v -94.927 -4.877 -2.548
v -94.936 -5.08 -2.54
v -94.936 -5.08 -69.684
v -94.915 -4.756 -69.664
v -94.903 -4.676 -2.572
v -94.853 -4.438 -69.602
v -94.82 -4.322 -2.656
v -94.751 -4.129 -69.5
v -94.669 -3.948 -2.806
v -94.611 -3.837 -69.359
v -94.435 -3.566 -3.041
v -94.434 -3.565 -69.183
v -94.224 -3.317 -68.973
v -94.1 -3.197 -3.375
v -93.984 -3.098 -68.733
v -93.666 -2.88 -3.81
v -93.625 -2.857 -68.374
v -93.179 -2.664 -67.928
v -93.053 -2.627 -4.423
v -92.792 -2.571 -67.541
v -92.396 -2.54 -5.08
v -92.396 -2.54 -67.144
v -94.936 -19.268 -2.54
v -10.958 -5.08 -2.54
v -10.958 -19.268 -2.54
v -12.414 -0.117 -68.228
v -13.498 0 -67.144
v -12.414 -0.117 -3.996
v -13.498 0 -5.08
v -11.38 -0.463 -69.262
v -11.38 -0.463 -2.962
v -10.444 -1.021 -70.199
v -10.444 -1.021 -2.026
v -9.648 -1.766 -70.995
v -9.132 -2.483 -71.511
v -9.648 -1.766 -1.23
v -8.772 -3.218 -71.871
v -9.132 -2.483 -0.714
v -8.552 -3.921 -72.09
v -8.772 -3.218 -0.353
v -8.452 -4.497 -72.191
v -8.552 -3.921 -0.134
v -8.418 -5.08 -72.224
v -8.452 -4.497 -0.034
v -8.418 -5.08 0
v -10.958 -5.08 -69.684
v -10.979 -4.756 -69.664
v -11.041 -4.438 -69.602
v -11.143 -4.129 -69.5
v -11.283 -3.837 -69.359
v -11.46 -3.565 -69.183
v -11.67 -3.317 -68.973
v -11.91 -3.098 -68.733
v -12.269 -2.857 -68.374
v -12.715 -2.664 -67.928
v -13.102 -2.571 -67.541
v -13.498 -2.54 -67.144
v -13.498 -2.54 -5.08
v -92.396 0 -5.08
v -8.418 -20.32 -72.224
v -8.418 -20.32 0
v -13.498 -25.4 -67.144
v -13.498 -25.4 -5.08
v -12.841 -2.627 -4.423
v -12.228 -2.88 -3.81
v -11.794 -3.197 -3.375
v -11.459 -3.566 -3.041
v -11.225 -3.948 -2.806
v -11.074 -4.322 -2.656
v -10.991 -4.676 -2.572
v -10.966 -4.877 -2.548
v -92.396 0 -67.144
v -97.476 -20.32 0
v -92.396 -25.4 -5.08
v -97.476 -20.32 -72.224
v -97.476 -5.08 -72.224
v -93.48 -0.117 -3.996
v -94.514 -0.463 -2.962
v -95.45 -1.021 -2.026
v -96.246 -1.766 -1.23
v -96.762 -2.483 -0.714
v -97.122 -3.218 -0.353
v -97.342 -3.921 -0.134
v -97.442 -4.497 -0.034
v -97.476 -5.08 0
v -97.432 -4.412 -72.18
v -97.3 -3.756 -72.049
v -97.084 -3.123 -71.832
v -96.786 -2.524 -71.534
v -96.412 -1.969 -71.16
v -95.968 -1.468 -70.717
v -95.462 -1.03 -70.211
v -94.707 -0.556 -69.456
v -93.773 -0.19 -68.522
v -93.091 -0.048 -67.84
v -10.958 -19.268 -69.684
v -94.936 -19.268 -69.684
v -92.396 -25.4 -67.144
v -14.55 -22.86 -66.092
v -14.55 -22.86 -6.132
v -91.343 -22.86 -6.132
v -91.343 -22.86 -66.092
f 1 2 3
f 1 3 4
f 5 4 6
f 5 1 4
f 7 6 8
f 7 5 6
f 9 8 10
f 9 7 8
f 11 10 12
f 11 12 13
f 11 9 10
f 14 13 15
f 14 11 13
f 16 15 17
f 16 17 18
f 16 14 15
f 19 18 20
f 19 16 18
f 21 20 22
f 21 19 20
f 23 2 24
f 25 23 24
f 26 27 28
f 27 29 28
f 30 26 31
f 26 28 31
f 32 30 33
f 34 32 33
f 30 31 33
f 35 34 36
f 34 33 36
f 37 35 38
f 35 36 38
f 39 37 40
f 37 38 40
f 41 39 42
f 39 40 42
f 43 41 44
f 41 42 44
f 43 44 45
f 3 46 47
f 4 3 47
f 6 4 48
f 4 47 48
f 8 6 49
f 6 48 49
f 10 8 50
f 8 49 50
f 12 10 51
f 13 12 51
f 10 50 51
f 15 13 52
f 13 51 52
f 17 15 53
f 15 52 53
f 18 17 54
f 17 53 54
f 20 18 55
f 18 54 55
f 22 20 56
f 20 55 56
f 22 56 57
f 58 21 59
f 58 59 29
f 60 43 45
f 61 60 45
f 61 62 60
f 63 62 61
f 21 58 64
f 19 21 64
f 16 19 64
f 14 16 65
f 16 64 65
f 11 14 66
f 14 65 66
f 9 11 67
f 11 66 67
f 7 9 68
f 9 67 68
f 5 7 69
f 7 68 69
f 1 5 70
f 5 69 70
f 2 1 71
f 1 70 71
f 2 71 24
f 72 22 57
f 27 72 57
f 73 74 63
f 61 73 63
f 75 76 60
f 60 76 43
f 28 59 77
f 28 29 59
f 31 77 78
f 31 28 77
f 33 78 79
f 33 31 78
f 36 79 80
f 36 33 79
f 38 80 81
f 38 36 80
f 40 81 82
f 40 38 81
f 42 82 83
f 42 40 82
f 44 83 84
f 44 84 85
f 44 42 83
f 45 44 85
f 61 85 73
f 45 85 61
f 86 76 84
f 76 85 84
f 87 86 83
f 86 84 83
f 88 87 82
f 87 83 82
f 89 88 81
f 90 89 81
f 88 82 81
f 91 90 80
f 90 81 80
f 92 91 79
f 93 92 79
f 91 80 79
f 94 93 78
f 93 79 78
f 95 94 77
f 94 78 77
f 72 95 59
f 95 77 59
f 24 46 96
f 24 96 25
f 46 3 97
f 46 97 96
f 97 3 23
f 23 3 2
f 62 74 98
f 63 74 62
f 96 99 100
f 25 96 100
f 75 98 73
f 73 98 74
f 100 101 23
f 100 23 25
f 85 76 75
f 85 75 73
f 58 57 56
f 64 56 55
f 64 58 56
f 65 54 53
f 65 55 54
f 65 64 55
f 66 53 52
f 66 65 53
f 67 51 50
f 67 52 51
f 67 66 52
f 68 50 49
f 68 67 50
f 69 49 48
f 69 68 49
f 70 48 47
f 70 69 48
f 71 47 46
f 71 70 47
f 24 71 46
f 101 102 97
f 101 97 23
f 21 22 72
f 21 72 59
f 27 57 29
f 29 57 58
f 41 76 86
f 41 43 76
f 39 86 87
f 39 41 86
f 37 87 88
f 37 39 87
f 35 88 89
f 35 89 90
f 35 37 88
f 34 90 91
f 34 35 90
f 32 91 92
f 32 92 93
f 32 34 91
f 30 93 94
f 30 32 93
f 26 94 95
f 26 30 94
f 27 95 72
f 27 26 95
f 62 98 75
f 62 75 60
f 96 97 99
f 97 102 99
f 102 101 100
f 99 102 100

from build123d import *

# Parameters (mm, degrees)
F0_W     = 89.0572415665
F0_H     = 72.2243338823
F1_DEPTH = 25.4
F2_SIZE  = 5.08
F3_R     = 5.08
F4_T     = -2.54


# Not quite as in the source:
# - a shell that OpenCascade refuses in one call is made with other operations: the cavity is built on its own and cut out


with BuildPart() as f1:
    # F0 (on Front) → F1 (new body)
    with BuildSketch(Plane.XZ):
        with Locations((-52.9469675384, -36.1121669412)):
            Rectangle(F0_W, F0_H)
    extrude(amount=F1_DEPTH)

    # F2
    f2_edges = [f1.edges().sort_by_distance(p)[0] for p in [
        (-97.475588, -25.4, -36.112167),
        (-52.946968, -25.4, 0),
        (-8.418347, -25.4, -36.112167),
        (-52.946968, -25.4, -72.224334),
    ]]
    chamfer(f2_edges, length=F2_SIZE)

    # F3
    f3_edges = [f1.edges().sort_by_distance(p)[0] for p in [
        (-8.418347, 0, -36.112167),
        (-52.946968, 0, 0),
        (-97.475588, 0, -36.112167),
        (-52.946968, 0, -72.224334),
    ]]
    fillet(f3_edges, radius=F3_R)

    # F4: a shell. OpenCascade refuses it in one call, so the cavity is built on its own and cut out:
    # the body offset inwards by the wall thickness, plus a prism from it out through each open face.
    f4_core = offset(f1.part, amount=F4_T, mode=Mode.PRIVATE)
    f4_exits = [f4_core.faces().sort_by_distance(p)[0] for p in [
        (-52.946968, -2.54, -36.112167),
    ]]
    add(f4_core, mode=Mode.SUBTRACT)
    extrude(f4_exits, amount=-F4_T, mode=Mode.SUBTRACT)


solid = f1.part
